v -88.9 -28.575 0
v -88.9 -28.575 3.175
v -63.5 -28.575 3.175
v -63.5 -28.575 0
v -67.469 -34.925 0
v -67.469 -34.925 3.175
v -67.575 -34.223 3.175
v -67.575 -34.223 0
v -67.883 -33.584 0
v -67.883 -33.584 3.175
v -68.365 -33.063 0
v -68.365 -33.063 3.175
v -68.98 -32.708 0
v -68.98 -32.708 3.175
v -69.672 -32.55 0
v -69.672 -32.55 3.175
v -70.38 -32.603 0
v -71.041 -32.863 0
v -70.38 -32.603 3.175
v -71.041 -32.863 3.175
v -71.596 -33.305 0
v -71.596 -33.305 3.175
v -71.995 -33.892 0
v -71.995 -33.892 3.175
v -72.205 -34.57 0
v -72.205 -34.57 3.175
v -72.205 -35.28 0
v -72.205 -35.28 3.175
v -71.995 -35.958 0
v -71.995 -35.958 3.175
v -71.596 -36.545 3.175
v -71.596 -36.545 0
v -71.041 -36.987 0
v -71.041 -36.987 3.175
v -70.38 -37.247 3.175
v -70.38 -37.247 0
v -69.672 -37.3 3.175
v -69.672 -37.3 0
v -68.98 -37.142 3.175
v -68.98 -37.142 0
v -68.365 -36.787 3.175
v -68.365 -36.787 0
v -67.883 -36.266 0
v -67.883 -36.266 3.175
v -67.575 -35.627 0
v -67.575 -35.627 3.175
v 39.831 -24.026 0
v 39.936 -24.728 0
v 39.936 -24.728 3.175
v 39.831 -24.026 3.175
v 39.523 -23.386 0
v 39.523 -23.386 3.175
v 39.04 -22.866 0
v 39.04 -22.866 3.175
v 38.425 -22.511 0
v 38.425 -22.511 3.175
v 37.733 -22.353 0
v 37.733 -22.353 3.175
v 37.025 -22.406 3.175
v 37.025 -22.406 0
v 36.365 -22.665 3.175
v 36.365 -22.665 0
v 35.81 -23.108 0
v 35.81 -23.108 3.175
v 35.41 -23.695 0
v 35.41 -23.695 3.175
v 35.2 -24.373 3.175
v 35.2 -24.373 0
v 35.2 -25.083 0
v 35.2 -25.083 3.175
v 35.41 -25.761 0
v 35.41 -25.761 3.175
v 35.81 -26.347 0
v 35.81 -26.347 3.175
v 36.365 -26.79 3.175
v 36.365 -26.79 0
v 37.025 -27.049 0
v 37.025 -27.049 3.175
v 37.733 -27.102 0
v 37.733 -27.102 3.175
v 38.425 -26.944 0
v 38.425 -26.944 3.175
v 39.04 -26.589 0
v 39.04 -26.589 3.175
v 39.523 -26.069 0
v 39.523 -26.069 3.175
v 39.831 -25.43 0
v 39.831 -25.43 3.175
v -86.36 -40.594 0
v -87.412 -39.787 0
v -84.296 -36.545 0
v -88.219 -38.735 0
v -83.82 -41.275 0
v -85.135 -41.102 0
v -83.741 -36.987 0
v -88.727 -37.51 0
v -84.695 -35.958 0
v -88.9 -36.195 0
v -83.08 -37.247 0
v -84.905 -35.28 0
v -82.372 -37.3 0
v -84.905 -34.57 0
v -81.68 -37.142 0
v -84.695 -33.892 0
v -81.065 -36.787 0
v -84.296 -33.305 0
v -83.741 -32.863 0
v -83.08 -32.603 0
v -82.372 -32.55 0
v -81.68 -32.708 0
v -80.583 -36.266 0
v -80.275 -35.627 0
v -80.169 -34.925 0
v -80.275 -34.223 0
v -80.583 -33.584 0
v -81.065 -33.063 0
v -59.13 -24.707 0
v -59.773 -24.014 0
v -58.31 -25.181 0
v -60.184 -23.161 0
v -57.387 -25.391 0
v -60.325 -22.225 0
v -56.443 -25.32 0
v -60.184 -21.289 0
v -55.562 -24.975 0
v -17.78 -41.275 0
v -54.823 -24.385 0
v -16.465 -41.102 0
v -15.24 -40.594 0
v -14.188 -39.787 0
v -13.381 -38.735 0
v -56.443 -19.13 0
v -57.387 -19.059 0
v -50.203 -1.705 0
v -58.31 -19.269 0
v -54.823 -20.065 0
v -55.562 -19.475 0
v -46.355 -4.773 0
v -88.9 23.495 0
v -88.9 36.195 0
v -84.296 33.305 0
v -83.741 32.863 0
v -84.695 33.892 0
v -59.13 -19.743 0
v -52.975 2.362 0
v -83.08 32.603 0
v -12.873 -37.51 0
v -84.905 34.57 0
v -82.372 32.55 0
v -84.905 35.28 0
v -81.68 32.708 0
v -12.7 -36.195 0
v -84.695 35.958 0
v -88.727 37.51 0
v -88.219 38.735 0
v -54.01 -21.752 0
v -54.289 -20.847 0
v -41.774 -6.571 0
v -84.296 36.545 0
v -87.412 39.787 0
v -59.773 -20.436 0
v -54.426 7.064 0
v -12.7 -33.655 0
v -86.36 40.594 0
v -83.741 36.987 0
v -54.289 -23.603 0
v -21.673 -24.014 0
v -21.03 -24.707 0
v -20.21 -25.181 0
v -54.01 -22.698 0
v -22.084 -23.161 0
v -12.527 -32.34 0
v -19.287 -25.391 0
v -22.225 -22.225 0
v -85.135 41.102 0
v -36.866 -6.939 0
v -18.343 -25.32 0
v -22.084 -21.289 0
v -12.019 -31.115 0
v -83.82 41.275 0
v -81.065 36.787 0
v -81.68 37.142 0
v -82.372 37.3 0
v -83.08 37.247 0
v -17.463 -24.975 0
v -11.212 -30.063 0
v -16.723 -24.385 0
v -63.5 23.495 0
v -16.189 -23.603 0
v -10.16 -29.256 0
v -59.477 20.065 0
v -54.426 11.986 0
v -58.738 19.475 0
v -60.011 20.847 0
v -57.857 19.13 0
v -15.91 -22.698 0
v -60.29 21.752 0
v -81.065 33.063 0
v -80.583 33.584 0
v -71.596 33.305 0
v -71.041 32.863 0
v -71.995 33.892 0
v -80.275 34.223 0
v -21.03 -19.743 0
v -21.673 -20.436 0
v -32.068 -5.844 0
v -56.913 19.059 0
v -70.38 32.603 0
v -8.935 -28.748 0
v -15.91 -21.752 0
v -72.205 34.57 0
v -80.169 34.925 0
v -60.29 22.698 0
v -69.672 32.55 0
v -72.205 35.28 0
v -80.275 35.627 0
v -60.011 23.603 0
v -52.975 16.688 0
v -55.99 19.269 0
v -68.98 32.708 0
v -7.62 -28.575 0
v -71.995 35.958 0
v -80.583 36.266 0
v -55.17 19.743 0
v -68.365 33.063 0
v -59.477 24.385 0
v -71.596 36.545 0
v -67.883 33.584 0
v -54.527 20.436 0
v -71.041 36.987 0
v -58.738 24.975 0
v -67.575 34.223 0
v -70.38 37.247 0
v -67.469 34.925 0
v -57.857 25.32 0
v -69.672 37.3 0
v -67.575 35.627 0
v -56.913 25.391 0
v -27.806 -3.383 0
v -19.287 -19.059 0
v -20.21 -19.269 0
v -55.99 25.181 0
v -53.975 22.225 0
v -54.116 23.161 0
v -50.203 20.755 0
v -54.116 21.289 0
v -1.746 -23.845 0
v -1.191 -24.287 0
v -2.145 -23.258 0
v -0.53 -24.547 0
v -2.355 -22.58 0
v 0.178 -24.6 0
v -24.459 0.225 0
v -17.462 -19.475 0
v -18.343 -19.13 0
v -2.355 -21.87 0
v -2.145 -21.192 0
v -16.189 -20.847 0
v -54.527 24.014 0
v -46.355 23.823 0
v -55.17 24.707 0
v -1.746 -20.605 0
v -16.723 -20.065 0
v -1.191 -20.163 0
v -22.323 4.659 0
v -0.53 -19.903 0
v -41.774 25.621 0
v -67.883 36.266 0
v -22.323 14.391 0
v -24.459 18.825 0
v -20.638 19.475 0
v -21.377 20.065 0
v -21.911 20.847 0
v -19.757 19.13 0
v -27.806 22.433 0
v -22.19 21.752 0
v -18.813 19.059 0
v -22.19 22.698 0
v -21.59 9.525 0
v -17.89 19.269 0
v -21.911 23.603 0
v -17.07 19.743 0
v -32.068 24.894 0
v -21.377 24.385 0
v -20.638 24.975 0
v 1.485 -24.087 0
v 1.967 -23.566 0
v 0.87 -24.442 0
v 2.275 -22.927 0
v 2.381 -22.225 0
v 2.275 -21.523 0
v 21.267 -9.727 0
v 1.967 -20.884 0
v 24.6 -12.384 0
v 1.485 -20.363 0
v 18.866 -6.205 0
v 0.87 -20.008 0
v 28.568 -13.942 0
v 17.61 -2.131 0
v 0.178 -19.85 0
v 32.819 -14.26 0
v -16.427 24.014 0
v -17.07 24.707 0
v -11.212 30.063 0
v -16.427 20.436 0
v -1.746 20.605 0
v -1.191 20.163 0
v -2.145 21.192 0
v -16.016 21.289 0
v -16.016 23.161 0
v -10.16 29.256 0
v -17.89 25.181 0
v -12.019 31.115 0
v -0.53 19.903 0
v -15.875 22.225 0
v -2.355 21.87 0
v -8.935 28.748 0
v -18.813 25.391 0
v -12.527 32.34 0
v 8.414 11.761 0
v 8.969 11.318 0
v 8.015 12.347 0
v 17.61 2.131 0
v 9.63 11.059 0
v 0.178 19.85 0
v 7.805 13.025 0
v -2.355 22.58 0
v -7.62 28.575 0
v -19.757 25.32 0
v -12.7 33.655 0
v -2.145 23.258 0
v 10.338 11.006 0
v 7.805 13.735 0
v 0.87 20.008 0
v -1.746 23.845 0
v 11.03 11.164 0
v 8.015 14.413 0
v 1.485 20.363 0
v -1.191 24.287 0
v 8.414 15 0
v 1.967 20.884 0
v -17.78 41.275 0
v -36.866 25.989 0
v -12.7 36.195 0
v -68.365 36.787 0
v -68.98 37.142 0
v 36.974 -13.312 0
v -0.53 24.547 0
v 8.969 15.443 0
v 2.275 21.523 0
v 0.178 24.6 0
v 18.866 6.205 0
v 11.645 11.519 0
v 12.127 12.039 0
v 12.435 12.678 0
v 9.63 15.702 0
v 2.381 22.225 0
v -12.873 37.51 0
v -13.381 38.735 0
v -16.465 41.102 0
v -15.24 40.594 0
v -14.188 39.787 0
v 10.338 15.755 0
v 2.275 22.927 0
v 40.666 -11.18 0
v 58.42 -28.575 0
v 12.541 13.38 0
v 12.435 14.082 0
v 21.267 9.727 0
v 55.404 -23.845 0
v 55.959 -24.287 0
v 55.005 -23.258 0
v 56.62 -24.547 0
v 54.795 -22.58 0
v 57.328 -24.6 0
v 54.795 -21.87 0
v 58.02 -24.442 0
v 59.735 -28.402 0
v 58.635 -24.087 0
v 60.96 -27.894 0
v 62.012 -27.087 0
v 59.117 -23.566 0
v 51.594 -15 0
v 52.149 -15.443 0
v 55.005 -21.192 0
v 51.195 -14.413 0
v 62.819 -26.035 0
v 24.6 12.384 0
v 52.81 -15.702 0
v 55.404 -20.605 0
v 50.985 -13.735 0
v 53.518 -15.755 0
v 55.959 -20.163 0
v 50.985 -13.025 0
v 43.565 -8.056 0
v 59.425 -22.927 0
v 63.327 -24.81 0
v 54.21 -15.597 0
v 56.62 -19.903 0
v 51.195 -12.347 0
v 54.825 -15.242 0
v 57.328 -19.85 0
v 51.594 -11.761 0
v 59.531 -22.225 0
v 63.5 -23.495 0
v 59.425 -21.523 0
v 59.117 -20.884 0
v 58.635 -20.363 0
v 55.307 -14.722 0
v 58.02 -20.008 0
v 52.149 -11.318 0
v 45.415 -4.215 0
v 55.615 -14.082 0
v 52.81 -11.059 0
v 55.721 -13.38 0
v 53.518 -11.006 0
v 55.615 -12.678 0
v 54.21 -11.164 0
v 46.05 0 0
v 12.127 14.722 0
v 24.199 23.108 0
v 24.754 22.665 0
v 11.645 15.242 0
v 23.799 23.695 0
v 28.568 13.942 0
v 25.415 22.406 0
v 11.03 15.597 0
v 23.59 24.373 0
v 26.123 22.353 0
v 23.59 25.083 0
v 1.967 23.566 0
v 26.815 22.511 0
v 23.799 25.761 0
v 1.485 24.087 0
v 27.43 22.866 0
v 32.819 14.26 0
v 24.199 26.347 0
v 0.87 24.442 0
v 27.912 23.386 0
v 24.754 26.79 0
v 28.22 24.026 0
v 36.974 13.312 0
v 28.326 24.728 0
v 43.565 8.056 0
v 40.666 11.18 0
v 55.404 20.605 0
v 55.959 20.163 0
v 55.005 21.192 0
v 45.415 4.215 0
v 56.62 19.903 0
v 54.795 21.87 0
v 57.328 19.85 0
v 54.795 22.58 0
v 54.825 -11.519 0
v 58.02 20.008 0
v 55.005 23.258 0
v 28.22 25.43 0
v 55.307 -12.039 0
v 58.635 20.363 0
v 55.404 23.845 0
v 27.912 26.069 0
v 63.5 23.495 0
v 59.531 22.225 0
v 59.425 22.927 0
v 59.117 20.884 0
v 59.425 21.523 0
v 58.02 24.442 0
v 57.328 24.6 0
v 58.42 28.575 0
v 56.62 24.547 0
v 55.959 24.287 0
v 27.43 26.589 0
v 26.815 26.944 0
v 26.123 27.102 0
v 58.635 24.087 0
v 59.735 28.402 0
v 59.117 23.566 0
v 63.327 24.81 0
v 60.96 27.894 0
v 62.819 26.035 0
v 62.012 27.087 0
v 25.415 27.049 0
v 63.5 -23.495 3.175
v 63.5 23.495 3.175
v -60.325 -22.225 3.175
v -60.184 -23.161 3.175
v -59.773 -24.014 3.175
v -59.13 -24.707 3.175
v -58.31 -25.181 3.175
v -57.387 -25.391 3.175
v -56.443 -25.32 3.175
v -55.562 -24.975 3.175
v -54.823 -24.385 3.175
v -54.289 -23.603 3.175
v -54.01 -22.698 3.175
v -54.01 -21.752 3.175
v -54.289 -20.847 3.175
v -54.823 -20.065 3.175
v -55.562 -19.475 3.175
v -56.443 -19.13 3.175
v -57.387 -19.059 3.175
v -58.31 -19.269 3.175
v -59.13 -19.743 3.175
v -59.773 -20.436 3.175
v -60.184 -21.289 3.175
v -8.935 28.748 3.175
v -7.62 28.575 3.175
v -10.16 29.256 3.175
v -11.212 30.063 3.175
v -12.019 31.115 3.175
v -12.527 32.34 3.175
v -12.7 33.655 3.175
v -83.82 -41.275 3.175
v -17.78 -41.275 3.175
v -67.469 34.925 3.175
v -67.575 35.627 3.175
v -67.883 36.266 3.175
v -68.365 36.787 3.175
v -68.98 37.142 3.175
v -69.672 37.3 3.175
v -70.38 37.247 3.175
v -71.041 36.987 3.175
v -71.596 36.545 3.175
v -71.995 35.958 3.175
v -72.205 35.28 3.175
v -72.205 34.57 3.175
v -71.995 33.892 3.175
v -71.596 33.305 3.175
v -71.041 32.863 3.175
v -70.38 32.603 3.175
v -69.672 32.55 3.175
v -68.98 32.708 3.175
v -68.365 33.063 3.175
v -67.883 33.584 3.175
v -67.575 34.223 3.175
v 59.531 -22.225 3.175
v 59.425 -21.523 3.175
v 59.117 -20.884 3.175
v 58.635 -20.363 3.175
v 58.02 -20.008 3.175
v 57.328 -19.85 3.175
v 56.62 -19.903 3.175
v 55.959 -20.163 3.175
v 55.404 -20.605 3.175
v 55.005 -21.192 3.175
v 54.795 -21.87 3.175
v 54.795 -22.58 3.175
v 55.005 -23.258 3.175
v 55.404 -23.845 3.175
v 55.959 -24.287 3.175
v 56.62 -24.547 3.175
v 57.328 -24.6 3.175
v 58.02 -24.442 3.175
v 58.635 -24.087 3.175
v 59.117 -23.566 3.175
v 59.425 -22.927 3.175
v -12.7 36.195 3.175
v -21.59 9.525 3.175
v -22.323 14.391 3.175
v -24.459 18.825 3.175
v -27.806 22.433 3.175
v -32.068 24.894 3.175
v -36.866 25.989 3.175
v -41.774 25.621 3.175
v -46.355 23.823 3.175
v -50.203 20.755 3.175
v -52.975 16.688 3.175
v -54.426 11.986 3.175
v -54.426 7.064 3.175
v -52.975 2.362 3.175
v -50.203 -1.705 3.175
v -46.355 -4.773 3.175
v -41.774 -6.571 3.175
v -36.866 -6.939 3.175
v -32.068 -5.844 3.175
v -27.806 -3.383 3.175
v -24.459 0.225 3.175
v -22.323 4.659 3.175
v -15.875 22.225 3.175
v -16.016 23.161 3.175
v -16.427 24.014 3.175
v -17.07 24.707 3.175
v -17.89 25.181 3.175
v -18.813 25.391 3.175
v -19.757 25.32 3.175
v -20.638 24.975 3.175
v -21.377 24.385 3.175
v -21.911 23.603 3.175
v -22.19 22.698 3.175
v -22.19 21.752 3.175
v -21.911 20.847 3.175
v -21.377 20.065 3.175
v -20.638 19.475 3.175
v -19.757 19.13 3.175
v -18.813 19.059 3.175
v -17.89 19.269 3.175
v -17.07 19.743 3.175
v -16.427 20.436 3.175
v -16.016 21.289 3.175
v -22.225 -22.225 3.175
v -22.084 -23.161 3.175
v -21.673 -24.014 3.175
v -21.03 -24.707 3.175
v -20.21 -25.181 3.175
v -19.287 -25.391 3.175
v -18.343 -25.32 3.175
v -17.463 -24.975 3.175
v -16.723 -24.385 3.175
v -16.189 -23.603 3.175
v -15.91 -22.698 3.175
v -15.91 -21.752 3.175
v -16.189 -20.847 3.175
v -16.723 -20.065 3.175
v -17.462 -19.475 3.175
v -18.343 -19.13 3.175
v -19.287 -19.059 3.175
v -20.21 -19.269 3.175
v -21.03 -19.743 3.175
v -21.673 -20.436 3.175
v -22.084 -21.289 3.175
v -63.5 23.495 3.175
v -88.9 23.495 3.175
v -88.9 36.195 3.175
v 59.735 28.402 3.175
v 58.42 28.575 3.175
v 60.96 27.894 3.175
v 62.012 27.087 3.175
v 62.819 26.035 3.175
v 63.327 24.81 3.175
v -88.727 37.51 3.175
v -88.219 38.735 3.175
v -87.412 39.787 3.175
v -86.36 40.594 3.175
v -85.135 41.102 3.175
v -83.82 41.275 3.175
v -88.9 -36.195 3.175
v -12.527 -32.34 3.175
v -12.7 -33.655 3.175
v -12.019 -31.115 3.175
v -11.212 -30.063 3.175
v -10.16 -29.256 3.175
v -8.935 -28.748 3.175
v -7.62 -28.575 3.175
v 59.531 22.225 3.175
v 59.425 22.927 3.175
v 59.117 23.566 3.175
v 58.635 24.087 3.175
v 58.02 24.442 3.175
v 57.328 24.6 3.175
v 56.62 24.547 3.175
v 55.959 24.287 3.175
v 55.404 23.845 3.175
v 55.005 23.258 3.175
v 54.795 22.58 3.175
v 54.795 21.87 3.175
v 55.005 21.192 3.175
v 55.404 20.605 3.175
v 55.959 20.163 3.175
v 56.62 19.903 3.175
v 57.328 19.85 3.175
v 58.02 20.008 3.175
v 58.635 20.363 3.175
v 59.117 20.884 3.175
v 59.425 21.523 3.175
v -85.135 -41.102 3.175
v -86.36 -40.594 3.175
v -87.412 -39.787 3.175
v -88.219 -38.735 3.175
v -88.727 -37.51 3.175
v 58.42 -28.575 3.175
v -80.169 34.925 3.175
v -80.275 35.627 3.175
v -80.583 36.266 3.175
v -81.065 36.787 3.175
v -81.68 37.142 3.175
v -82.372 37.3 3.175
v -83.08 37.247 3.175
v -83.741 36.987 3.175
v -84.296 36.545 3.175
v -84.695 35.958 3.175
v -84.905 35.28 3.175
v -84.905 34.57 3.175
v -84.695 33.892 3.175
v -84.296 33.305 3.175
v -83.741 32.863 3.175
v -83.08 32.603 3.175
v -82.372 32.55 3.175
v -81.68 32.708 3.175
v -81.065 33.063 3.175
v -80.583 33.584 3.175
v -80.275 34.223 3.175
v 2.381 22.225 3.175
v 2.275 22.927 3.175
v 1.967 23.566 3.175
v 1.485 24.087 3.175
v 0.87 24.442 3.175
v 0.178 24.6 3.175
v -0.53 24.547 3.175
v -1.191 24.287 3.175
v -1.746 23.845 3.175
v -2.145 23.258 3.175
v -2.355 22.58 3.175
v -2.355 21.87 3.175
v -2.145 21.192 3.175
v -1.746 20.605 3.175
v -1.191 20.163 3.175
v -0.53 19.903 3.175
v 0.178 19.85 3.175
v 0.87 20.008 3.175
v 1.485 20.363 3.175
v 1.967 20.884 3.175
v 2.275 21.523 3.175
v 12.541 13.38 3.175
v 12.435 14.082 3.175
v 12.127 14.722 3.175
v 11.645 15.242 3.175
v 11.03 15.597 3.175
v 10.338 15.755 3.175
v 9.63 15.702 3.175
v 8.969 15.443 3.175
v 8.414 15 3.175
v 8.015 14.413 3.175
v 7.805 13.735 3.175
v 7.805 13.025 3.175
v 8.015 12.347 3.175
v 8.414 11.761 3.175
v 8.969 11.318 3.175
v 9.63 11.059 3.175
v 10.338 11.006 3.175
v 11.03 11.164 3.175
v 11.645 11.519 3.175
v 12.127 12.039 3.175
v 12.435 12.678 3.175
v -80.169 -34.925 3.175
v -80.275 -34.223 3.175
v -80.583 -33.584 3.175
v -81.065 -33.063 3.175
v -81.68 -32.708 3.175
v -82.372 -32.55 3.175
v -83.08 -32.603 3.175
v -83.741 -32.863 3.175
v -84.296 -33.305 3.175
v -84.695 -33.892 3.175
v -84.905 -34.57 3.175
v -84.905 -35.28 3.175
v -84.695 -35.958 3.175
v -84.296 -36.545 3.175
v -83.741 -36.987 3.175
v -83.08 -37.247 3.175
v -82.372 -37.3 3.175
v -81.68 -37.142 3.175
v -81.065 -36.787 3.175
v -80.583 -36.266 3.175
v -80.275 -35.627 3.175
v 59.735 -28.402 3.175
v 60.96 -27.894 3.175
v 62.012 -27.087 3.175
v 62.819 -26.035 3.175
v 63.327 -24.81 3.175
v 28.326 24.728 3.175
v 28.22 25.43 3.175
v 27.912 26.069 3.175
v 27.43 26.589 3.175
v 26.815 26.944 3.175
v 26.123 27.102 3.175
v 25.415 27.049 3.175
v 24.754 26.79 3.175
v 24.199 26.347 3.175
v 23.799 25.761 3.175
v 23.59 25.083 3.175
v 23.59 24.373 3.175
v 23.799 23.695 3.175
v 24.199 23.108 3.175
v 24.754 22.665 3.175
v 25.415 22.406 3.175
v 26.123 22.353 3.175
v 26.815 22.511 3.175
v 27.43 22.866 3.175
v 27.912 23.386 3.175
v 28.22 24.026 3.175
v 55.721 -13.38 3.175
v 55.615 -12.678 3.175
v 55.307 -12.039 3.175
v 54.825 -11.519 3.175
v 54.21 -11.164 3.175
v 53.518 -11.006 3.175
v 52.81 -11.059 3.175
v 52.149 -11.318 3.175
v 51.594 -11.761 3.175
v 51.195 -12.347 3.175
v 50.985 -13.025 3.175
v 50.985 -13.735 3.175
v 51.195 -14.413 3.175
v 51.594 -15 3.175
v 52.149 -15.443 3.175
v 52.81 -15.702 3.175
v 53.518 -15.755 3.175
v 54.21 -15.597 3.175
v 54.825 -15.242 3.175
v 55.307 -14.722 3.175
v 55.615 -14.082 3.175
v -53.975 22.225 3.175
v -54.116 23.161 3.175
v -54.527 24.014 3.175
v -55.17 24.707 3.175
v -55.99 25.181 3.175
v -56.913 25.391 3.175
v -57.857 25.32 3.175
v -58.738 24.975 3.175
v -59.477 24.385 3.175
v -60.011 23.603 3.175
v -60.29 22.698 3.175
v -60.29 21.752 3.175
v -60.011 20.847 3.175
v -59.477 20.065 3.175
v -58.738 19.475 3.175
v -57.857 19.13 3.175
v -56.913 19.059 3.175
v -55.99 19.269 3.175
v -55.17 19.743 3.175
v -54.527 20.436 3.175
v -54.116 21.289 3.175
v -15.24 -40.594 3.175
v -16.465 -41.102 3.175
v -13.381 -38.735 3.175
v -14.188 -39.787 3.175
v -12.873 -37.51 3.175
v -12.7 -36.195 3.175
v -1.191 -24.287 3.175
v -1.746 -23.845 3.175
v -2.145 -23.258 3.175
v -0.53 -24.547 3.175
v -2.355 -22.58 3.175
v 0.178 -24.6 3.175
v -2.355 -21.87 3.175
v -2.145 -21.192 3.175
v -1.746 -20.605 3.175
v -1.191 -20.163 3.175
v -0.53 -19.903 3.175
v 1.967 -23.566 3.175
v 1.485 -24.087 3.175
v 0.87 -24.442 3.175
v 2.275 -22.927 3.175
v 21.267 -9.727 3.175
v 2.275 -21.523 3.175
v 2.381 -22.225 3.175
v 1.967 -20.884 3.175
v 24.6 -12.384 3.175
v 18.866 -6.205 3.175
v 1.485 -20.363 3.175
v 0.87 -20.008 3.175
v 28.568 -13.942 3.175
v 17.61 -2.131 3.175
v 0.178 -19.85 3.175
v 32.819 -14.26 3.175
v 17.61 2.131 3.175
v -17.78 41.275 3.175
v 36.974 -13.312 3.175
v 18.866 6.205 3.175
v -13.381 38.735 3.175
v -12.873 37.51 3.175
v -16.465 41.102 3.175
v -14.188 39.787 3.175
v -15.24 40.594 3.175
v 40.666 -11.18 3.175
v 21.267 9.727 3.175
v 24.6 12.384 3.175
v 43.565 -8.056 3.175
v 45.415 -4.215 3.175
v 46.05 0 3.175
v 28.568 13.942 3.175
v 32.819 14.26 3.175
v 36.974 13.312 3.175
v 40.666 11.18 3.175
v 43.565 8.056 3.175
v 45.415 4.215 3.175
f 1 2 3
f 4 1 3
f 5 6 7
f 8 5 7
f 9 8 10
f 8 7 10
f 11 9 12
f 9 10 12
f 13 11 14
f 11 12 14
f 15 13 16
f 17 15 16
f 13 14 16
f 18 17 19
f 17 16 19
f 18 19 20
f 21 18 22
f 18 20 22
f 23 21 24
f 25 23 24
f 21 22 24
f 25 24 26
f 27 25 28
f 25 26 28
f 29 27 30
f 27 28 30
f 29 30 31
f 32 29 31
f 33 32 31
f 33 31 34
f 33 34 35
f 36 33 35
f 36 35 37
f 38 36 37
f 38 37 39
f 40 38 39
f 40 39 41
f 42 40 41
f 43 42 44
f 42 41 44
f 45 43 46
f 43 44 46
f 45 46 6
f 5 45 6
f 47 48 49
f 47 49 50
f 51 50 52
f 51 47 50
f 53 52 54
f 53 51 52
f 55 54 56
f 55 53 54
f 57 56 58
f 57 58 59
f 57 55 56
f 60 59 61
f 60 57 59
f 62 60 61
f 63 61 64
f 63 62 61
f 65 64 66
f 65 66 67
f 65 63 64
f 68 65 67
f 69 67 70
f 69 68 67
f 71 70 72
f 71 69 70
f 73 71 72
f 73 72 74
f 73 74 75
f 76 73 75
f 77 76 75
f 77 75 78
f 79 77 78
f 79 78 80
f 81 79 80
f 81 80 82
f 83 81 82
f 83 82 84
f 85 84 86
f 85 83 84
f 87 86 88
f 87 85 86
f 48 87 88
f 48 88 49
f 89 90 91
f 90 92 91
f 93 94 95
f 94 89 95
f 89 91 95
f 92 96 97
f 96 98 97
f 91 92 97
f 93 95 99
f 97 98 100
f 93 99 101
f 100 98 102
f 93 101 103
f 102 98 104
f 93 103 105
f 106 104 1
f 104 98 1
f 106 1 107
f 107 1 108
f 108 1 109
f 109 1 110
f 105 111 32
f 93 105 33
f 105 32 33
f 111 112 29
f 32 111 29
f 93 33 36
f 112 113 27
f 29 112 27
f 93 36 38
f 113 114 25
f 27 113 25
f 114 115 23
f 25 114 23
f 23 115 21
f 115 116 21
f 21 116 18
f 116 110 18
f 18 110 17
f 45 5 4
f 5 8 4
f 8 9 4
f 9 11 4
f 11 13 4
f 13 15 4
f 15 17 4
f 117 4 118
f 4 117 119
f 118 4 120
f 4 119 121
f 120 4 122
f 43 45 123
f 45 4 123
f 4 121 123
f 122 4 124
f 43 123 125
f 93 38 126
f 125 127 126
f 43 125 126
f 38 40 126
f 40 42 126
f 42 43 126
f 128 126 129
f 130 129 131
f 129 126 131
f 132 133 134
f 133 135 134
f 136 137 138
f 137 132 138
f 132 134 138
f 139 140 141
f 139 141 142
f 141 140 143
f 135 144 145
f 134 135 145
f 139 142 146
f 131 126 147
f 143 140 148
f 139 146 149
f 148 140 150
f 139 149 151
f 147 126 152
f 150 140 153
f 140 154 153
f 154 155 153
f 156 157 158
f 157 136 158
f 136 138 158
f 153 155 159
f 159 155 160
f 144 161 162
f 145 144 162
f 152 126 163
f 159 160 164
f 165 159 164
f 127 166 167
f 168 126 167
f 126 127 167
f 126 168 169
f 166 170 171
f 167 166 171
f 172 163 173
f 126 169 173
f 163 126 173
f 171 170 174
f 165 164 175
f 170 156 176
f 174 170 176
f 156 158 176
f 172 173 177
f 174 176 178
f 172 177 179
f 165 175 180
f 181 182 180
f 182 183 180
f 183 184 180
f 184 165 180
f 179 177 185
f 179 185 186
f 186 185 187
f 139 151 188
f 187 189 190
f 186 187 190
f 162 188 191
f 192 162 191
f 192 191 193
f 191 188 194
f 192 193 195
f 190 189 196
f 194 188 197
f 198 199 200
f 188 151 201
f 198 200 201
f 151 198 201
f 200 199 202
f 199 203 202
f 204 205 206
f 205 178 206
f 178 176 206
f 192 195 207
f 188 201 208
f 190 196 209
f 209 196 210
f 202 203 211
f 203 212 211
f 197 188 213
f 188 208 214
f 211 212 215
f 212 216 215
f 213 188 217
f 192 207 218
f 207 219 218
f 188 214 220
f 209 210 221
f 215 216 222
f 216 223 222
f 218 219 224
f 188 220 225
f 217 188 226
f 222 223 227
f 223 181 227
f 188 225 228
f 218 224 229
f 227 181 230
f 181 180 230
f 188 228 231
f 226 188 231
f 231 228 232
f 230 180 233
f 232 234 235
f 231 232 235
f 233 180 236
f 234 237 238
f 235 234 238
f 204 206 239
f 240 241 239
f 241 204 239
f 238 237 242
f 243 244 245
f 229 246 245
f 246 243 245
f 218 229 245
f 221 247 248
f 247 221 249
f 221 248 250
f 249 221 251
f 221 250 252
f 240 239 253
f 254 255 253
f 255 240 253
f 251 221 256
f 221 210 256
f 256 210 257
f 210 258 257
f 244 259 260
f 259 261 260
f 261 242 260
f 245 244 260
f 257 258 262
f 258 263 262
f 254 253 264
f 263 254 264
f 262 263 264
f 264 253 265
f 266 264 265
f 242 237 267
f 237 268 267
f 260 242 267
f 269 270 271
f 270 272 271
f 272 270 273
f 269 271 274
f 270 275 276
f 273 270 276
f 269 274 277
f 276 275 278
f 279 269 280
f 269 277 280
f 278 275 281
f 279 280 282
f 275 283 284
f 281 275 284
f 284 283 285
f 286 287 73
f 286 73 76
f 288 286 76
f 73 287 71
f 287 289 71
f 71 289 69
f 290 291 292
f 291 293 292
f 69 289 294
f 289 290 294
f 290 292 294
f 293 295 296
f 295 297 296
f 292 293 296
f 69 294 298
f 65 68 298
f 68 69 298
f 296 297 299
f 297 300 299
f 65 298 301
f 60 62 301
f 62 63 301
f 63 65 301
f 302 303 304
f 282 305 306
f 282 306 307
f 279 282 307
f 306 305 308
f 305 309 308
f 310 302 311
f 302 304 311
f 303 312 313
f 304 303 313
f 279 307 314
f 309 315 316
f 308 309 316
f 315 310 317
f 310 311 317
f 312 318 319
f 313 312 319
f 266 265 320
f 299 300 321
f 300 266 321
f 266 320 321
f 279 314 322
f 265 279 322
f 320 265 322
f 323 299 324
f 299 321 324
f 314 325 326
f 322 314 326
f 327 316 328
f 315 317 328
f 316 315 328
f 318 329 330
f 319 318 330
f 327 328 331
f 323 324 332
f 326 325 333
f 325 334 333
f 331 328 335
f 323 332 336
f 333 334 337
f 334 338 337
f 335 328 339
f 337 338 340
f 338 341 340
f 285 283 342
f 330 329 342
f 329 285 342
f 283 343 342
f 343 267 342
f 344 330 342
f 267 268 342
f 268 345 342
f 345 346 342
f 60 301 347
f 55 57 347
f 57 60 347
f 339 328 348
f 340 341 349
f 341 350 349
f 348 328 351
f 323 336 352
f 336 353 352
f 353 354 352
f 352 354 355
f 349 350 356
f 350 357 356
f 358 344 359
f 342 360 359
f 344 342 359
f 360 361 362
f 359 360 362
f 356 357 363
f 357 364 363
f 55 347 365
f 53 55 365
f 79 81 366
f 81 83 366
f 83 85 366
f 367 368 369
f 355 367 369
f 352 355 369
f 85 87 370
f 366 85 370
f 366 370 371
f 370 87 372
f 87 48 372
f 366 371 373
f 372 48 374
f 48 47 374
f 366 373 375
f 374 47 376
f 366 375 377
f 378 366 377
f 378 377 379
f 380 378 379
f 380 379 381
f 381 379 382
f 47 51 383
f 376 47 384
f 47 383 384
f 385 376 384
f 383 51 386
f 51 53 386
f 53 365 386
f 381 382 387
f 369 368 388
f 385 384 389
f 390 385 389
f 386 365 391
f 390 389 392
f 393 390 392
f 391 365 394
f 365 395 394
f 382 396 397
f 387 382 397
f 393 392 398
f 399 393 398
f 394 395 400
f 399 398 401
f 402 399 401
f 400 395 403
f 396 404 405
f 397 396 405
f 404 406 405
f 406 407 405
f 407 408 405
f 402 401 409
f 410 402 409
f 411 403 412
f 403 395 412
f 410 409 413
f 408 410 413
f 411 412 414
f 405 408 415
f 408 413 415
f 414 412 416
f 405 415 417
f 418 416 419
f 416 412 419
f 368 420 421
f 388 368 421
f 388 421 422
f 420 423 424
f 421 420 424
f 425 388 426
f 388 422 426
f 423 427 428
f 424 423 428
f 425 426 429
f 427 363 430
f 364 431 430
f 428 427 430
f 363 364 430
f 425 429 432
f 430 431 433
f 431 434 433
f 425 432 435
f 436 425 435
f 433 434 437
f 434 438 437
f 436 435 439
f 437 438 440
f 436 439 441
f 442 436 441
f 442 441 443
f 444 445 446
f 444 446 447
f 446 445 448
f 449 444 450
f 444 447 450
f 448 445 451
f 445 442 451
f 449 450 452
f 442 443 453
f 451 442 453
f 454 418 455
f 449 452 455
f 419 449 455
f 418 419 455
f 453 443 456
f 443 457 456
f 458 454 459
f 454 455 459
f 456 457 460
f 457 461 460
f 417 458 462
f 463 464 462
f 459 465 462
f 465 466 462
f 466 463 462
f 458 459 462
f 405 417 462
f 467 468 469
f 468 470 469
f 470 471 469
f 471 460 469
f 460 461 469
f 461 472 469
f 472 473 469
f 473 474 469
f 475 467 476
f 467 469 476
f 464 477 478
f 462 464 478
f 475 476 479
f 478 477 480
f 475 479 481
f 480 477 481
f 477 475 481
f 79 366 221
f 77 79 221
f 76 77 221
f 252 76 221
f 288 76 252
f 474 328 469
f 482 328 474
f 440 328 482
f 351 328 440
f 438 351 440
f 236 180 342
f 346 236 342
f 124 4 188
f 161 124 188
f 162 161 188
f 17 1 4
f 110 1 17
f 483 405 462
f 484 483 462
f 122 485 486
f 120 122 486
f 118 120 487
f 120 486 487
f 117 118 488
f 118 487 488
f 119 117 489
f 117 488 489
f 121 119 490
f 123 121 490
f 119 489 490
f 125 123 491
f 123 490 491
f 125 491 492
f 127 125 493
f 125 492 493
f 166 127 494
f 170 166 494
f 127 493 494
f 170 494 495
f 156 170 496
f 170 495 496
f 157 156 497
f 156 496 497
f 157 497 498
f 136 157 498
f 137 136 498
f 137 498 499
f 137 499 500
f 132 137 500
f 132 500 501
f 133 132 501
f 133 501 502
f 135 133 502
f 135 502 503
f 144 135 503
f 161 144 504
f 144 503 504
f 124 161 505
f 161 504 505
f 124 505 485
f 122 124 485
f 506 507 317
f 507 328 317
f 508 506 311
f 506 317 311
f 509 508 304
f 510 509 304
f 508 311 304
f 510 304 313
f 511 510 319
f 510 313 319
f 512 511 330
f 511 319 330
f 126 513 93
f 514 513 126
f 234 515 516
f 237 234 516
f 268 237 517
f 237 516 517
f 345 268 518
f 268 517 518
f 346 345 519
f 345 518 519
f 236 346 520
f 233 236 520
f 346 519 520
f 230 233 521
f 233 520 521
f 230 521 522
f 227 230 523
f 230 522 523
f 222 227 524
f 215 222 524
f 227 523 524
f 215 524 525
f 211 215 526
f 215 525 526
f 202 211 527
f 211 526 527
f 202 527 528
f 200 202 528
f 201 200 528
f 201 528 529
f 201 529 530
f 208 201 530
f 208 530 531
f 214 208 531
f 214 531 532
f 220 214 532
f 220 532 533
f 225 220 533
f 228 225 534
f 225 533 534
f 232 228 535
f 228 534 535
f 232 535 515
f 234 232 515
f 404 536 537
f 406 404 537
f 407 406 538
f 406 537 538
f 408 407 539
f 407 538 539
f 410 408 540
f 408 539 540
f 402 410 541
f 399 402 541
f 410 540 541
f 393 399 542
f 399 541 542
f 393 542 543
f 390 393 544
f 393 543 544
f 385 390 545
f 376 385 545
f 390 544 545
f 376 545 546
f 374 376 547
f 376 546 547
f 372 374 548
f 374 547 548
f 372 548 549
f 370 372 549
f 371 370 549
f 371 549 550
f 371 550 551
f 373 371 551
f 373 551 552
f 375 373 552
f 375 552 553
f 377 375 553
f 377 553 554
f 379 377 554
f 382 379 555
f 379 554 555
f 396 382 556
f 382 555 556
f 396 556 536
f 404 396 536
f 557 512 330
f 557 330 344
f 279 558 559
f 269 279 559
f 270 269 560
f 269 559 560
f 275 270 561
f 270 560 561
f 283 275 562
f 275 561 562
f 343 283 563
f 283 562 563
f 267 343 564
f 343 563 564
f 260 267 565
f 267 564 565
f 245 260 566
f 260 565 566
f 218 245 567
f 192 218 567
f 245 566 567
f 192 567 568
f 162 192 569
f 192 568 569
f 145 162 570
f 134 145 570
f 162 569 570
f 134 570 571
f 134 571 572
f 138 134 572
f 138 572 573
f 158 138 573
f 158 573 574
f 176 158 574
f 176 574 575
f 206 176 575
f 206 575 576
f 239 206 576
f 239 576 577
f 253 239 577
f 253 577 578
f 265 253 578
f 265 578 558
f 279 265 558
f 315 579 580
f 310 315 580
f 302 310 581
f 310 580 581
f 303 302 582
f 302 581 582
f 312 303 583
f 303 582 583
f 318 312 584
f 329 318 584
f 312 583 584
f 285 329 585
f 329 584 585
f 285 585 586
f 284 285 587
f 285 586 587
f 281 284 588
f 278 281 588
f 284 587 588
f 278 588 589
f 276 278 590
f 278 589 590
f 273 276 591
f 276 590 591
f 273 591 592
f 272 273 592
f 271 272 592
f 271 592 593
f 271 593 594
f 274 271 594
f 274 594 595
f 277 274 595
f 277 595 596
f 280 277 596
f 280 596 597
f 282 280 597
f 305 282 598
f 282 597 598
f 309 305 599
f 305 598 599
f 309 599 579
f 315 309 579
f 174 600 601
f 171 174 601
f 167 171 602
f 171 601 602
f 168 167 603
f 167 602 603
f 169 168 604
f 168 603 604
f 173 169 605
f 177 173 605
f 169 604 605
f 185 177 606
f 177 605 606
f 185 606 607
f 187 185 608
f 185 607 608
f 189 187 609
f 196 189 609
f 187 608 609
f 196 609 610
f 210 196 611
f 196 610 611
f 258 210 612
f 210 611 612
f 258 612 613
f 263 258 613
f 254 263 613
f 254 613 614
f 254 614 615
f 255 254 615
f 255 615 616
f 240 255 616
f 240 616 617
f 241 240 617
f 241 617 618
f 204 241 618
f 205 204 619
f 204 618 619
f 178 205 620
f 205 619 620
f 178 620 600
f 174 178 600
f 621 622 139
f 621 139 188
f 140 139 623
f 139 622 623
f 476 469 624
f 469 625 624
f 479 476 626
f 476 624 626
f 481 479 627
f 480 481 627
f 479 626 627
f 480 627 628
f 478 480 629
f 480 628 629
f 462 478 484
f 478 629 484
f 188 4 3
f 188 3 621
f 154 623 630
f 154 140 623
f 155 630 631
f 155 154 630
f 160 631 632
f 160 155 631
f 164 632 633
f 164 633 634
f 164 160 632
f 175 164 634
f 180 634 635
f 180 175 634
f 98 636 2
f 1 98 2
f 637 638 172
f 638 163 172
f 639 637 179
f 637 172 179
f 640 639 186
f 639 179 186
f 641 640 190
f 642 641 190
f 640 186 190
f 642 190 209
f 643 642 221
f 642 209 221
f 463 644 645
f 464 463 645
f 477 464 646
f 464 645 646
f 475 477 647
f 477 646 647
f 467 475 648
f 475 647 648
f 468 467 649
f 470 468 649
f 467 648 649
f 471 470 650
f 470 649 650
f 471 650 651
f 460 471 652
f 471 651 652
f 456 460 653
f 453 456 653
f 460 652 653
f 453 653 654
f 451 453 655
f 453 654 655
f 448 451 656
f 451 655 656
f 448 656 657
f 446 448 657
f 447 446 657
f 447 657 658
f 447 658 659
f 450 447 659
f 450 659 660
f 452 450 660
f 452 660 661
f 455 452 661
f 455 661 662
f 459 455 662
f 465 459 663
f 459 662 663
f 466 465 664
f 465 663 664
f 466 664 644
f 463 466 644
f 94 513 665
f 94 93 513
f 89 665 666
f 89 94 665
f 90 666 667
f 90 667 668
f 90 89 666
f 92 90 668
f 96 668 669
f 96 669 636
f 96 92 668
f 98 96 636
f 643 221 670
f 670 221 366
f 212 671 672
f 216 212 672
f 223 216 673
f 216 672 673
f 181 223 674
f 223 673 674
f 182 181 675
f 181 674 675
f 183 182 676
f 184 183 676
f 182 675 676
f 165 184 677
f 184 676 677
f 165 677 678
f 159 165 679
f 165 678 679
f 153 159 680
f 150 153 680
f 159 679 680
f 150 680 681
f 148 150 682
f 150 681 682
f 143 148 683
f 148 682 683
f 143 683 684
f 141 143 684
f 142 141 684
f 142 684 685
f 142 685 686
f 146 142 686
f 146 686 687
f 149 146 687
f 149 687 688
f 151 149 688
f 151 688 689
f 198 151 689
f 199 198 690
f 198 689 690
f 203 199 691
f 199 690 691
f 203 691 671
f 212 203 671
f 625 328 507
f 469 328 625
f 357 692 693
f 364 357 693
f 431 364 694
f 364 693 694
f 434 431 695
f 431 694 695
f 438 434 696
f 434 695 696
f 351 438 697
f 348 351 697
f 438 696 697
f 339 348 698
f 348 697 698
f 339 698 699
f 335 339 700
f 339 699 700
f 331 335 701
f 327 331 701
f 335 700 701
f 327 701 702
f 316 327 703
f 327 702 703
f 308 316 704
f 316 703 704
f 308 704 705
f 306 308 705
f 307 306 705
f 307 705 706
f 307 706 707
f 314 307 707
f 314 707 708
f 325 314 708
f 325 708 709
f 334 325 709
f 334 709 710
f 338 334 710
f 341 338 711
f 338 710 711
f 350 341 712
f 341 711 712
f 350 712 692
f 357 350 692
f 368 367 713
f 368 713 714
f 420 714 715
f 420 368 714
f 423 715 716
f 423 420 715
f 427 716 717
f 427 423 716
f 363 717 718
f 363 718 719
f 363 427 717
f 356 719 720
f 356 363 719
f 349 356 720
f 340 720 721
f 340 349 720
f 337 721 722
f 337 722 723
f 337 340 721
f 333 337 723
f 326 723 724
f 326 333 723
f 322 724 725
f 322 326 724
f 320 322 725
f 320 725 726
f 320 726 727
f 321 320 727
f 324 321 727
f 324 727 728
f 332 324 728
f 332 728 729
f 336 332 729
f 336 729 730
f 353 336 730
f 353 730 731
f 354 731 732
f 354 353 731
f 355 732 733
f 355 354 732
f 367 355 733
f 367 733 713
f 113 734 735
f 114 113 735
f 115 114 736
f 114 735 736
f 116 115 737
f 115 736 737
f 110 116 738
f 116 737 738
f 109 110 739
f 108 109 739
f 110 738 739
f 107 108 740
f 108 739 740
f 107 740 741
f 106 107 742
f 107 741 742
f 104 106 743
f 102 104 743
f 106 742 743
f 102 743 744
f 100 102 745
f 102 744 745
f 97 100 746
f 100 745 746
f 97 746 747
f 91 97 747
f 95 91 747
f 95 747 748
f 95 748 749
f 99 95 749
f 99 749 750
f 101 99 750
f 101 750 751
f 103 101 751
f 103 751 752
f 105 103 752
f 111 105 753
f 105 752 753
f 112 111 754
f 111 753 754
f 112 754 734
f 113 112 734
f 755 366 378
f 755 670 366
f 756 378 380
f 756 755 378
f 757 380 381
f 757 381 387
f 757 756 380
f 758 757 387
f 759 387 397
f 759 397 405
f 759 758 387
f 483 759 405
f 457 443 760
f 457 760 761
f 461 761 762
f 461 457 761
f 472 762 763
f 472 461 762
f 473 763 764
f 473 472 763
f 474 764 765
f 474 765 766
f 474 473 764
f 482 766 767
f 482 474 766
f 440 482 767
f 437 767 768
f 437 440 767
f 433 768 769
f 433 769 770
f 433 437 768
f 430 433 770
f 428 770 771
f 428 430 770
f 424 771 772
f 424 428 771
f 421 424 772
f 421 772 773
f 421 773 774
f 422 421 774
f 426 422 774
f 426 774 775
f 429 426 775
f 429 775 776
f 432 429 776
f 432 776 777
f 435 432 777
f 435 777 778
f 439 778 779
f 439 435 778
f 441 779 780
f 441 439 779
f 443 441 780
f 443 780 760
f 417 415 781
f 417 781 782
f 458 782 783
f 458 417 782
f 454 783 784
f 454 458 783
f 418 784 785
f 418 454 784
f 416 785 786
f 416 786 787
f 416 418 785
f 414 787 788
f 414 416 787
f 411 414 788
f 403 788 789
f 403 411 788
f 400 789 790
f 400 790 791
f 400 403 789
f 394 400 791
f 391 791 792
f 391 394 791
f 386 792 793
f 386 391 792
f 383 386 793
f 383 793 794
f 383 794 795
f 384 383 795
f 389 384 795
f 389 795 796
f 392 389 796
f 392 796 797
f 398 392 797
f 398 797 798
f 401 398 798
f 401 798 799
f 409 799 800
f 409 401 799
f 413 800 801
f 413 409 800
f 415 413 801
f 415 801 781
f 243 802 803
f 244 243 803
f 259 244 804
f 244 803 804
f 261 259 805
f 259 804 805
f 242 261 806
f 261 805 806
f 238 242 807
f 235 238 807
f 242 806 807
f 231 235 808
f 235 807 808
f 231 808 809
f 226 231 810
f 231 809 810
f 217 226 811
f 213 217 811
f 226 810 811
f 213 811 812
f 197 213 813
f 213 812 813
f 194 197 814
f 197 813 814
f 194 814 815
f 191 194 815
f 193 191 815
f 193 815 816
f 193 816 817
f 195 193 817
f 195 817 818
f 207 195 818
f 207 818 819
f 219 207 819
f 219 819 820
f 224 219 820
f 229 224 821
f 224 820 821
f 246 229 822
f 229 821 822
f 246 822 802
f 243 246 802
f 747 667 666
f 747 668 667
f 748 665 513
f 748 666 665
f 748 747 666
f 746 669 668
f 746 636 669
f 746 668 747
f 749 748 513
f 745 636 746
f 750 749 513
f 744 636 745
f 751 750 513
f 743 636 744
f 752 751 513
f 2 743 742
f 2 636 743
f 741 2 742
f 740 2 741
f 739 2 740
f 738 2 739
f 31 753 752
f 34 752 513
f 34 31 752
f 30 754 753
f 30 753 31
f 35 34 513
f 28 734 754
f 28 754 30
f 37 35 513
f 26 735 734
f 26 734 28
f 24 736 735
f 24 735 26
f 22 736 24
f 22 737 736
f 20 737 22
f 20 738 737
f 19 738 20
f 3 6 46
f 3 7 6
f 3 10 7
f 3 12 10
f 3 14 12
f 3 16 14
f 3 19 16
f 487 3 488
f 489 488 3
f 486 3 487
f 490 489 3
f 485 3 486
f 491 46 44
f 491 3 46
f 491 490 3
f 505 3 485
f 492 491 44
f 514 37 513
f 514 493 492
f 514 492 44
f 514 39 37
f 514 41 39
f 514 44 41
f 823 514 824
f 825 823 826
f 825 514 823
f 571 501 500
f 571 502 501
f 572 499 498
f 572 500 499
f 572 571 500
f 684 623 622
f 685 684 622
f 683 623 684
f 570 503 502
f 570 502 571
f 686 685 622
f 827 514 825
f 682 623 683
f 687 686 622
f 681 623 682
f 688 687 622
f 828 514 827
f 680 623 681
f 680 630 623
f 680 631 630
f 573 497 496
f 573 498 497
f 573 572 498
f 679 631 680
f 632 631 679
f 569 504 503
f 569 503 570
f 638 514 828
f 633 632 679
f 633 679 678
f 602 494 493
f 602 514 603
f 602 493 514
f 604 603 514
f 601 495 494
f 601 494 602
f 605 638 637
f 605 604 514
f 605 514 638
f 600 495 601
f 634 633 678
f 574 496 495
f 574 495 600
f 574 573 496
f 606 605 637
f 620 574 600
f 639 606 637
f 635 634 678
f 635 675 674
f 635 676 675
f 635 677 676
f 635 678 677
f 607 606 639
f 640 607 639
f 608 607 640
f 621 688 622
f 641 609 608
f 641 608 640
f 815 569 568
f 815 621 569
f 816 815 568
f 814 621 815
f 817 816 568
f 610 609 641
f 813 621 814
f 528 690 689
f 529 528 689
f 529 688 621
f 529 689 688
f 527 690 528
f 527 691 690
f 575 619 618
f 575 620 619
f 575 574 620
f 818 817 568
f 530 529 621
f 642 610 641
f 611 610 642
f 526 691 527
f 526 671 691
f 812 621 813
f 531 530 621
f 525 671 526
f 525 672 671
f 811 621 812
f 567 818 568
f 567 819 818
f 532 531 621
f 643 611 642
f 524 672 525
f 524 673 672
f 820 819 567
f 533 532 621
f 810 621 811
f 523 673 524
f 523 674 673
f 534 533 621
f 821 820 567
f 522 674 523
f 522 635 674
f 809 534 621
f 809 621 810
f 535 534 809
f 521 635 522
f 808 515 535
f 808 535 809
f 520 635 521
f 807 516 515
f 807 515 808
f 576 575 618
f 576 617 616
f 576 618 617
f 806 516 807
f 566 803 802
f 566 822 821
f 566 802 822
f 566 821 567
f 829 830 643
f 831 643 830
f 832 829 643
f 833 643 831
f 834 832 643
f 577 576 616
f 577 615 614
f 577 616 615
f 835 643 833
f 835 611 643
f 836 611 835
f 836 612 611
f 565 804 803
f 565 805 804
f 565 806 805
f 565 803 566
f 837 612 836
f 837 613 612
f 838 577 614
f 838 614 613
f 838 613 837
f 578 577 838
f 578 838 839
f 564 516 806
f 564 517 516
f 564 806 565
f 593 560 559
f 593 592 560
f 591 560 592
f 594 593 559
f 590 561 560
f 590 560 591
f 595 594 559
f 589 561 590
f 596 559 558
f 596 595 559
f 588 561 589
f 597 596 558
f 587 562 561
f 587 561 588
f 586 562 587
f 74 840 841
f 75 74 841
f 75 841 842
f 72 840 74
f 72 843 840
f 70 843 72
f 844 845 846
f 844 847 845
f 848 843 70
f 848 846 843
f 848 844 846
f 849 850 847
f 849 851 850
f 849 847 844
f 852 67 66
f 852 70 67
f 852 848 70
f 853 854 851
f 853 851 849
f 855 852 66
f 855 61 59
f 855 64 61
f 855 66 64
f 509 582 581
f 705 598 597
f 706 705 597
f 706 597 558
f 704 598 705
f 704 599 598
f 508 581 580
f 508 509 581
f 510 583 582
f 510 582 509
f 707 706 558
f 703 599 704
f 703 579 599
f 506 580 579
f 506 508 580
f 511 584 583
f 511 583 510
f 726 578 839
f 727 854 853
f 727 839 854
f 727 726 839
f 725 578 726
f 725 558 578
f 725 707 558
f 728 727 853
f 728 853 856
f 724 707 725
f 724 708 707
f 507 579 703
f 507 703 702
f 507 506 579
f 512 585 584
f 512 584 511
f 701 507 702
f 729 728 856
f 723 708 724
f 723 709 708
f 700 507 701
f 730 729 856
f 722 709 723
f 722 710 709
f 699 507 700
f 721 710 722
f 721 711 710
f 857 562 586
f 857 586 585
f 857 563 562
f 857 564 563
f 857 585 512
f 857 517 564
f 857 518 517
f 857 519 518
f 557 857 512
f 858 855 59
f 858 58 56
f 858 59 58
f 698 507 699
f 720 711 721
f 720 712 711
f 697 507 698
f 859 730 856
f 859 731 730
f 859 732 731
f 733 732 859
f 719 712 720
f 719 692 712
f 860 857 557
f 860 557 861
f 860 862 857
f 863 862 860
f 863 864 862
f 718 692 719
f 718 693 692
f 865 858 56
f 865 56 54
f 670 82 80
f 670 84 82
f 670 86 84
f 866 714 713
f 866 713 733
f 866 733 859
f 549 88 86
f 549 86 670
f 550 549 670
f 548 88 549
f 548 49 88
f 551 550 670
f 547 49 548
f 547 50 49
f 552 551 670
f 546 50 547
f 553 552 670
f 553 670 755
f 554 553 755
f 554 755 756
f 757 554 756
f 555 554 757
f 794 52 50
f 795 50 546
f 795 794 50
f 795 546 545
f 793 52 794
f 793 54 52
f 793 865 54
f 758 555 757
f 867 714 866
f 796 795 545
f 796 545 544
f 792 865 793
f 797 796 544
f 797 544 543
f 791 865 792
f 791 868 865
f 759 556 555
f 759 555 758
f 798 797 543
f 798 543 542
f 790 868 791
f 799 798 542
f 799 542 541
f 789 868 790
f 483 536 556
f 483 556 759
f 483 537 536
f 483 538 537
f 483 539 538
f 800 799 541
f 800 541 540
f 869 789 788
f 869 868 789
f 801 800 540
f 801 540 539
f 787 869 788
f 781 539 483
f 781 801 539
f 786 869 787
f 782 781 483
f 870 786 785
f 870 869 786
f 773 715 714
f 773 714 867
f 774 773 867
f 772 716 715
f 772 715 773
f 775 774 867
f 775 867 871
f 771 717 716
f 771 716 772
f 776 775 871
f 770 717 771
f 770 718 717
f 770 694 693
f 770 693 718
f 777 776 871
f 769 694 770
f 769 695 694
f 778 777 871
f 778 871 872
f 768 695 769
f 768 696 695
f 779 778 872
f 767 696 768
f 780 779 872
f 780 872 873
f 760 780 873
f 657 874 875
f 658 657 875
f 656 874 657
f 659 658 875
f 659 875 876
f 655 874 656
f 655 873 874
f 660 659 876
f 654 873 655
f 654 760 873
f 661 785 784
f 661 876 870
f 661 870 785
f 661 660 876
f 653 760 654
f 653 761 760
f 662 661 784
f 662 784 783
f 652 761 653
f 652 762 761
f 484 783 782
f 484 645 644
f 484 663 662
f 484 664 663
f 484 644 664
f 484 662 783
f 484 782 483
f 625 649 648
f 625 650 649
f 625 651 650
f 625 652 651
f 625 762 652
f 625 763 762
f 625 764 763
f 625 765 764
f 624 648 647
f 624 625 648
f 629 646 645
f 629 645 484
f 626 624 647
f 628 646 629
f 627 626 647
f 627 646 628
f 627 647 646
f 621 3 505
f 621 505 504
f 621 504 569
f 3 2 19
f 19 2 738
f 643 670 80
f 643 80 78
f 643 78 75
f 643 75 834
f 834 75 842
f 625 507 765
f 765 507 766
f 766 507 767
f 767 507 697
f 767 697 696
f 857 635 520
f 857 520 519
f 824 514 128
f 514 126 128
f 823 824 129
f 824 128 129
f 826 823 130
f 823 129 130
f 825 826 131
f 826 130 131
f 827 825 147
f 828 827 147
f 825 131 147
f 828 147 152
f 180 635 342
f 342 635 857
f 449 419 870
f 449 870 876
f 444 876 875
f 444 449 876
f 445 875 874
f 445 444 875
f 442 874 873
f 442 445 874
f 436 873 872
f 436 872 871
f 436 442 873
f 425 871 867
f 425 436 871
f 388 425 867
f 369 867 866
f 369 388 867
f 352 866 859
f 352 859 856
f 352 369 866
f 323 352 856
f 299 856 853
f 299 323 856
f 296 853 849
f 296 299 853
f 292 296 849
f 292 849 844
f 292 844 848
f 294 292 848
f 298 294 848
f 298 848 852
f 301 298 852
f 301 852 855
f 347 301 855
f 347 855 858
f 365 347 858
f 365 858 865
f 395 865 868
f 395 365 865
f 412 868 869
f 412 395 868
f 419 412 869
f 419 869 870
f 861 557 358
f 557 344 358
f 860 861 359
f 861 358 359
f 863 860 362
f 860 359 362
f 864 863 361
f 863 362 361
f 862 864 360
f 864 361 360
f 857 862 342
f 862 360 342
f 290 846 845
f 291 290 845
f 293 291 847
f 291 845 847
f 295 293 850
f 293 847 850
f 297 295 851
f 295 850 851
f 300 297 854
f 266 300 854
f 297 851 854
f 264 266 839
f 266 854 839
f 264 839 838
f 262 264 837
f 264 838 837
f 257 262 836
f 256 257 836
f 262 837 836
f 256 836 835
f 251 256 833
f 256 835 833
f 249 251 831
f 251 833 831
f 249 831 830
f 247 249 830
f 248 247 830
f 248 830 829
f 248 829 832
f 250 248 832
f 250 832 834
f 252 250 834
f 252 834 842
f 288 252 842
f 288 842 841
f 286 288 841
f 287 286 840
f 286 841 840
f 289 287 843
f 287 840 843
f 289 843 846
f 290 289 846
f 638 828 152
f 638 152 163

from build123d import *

# Parameters (mm, degrees)
SKETCH1_W           = 127
SKETCH1_H           = 57.15
SKETCH1_R           = 14.3002
SKETCH1_R_2         = 2.38125
BOSS_EXTRUDE1_DEPTH = 3.175
SKETCH2_R           = 2.38125
CUT_EXTRUDE1_DEPTH  = 3.175
FILLET1_R           = 5.08
SKETCH3_R           = 3.175
CUT_EXTRUDE2_DEPTH  = 3.175
SKETCH4_R           = 16.51
CUT_EXTRUDE3_DEPTH  = 7.62
SKETCH5_W           = 76.2
SKETCH5_H           = 12.7
BOSS_EXTRUDE2_DEPTH = 3.175
FILLET2_R           = 5.08
SKETCH6_W           = 25.4
SKETCH6_H           = 5.08
BOSS_EXTRUDE3_DEPTH = 3.175
FILLET3_R           = 5.08
SKETCH7_R           = 2.38125
CUT_EXTRUDE4_DEPTH  = 3.175


with BuildPart() as part:
    # Sketch1 → Boss-Extrude1 (new body)
    with BuildSketch(Plane.XY):
        Rectangle(SKETCH1_W, SKETCH1_H)
        with Locations((31.75, 0)):
            Circle(SKETCH1_R, mode=Mode.SUBTRACT)
        with Locations((37.555148495, -24.727722316)):
            Circle(SKETCH1_R_2, mode=Mode.SUBTRACT)
        with Locations((10.16, 13.380280266)):
            Circle(SKETCH1_R_2, mode=Mode.SUBTRACT)
        with Locations((25.944851505, 24.727722316)):
            Circle(SKETCH1_R_2, mode=Mode.SUBTRACT)
        with Locations((53.34, -13.380280266)):
            Circle(SKETCH1_R_2, mode=Mode.SUBTRACT)
    extrude(amount=BOSS_EXTRUDE1_DEPTH)

    # Sketch2 → Cut-Extrude1 (cut)
    with BuildSketch(Plane.XY.offset(3.175)):
        with Locations((57.15, 22.225)):
            Circle(SKETCH2_R)
        with Locations((57.15, -22.225)):
            Circle(SKETCH2_R)
        with Locations((0, 22.225)):
            Circle(SKETCH2_R)
        with Locations((0, -22.225)):
            Circle(SKETCH2_R)
    extrude(amount=-CUT_EXTRUDE1_DEPTH, mode=Mode.SUBTRACT)

    # Fillet1
    fillet1_edges = [part.edges().sort_by_distance(p)[0] for p in [
        (63.5, -28.575, 1.5875),
        (63.5, 28.575, 1.5875),
    ]]
    fillet(fillet1_edges, radius=FILLET1_R)

    # Sketch3 → Cut-Extrude2 (cut)
    with BuildSketch(Plane.XY.offset(3.175)):
        with Locations((-57.15, 22.225)):
            Circle(SKETCH3_R)
        with Locations((-19.05, 22.225)):
            Circle(SKETCH3_R)
        with Locations(Location((-19.05, -22.225, 0), (0, 0, 180))):
            Circle(SKETCH3_R)
        with Locations(Location((-57.15, -22.225, 0), (0, 0, 180))):
            Circle(SKETCH3_R)
    extrude(amount=-CUT_EXTRUDE2_DEPTH, mode=Mode.SUBTRACT)

    # Sketch4 → Cut-Extrude3 (cut)
    with BuildSketch(Plane.XY.offset(3.175)):
        with Locations((-38.1, 9.525)):
            Circle(SKETCH4_R)
    extrude(amount=-CUT_EXTRUDE3_DEPTH, mode=Mode.SUBTRACT)

    # Sketch5 → Boss-Extrude2 (add)
    with BuildSketch(Plane.XY.offset(3.175)):
        with Locations((-50.8, -34.925)):
            Rectangle(SKETCH5_W, SKETCH5_H)
        with Locations((-50.8, 34.925)):
            Rectangle(SKETCH5_W, SKETCH5_H)
    extrude(amount=-BOSS_EXTRUDE2_DEPTH)

    # Fillet2
    fillet2_edges = [part.edges().sort_by_distance(p)[0] for p in [
        (-12.7, 41.275, 1.5875),
        (-12.7, 28.575, 1.5875),
        (-12.7, -28.575, 1.5875),
        (-12.7, -41.275, 1.5875),
    ]]
    fillet(fillet2_edges, radius=FILLET2_R)

    # Sketch6 → Boss-Extrude3 (add)
    with BuildSketch(Plane.XY.offset(3.175)):
        with Locations((-76.2, 26.035)):
            Rectangle(SKETCH6_W, SKETCH6_H)
    extrude(amount=-BOSS_EXTRUDE3_DEPTH)

    # Fillet3
    fillet3_edges = [part.edges().sort_by_distance(p)[0] for p in [
        (-88.9, 41.275, 1.5875),
        (-88.9, -41.275, 1.5875),
    ]]
    fillet(fillet3_edges, radius=FILLET3_R)

    # Sketch7 → Cut-Extrude4 (cut)
    with BuildSketch(Plane.XY.offset(3.175)):
        with Locations((-82.55, 34.925)):
            Circle(SKETCH7_R)
        with Locations((-82.55, -34.925)):
            Circle(SKETCH7_R)
        with Locations((-69.85, 34.925)):
            Circle(SKETCH7_R)
        with Locations((-69.85, -34.925)):
            Circle(SKETCH7_R)
    extrude(amount=-CUT_EXTRUDE4_DEPTH, mode=Mode.SUBTRACT)


solid = part.part
